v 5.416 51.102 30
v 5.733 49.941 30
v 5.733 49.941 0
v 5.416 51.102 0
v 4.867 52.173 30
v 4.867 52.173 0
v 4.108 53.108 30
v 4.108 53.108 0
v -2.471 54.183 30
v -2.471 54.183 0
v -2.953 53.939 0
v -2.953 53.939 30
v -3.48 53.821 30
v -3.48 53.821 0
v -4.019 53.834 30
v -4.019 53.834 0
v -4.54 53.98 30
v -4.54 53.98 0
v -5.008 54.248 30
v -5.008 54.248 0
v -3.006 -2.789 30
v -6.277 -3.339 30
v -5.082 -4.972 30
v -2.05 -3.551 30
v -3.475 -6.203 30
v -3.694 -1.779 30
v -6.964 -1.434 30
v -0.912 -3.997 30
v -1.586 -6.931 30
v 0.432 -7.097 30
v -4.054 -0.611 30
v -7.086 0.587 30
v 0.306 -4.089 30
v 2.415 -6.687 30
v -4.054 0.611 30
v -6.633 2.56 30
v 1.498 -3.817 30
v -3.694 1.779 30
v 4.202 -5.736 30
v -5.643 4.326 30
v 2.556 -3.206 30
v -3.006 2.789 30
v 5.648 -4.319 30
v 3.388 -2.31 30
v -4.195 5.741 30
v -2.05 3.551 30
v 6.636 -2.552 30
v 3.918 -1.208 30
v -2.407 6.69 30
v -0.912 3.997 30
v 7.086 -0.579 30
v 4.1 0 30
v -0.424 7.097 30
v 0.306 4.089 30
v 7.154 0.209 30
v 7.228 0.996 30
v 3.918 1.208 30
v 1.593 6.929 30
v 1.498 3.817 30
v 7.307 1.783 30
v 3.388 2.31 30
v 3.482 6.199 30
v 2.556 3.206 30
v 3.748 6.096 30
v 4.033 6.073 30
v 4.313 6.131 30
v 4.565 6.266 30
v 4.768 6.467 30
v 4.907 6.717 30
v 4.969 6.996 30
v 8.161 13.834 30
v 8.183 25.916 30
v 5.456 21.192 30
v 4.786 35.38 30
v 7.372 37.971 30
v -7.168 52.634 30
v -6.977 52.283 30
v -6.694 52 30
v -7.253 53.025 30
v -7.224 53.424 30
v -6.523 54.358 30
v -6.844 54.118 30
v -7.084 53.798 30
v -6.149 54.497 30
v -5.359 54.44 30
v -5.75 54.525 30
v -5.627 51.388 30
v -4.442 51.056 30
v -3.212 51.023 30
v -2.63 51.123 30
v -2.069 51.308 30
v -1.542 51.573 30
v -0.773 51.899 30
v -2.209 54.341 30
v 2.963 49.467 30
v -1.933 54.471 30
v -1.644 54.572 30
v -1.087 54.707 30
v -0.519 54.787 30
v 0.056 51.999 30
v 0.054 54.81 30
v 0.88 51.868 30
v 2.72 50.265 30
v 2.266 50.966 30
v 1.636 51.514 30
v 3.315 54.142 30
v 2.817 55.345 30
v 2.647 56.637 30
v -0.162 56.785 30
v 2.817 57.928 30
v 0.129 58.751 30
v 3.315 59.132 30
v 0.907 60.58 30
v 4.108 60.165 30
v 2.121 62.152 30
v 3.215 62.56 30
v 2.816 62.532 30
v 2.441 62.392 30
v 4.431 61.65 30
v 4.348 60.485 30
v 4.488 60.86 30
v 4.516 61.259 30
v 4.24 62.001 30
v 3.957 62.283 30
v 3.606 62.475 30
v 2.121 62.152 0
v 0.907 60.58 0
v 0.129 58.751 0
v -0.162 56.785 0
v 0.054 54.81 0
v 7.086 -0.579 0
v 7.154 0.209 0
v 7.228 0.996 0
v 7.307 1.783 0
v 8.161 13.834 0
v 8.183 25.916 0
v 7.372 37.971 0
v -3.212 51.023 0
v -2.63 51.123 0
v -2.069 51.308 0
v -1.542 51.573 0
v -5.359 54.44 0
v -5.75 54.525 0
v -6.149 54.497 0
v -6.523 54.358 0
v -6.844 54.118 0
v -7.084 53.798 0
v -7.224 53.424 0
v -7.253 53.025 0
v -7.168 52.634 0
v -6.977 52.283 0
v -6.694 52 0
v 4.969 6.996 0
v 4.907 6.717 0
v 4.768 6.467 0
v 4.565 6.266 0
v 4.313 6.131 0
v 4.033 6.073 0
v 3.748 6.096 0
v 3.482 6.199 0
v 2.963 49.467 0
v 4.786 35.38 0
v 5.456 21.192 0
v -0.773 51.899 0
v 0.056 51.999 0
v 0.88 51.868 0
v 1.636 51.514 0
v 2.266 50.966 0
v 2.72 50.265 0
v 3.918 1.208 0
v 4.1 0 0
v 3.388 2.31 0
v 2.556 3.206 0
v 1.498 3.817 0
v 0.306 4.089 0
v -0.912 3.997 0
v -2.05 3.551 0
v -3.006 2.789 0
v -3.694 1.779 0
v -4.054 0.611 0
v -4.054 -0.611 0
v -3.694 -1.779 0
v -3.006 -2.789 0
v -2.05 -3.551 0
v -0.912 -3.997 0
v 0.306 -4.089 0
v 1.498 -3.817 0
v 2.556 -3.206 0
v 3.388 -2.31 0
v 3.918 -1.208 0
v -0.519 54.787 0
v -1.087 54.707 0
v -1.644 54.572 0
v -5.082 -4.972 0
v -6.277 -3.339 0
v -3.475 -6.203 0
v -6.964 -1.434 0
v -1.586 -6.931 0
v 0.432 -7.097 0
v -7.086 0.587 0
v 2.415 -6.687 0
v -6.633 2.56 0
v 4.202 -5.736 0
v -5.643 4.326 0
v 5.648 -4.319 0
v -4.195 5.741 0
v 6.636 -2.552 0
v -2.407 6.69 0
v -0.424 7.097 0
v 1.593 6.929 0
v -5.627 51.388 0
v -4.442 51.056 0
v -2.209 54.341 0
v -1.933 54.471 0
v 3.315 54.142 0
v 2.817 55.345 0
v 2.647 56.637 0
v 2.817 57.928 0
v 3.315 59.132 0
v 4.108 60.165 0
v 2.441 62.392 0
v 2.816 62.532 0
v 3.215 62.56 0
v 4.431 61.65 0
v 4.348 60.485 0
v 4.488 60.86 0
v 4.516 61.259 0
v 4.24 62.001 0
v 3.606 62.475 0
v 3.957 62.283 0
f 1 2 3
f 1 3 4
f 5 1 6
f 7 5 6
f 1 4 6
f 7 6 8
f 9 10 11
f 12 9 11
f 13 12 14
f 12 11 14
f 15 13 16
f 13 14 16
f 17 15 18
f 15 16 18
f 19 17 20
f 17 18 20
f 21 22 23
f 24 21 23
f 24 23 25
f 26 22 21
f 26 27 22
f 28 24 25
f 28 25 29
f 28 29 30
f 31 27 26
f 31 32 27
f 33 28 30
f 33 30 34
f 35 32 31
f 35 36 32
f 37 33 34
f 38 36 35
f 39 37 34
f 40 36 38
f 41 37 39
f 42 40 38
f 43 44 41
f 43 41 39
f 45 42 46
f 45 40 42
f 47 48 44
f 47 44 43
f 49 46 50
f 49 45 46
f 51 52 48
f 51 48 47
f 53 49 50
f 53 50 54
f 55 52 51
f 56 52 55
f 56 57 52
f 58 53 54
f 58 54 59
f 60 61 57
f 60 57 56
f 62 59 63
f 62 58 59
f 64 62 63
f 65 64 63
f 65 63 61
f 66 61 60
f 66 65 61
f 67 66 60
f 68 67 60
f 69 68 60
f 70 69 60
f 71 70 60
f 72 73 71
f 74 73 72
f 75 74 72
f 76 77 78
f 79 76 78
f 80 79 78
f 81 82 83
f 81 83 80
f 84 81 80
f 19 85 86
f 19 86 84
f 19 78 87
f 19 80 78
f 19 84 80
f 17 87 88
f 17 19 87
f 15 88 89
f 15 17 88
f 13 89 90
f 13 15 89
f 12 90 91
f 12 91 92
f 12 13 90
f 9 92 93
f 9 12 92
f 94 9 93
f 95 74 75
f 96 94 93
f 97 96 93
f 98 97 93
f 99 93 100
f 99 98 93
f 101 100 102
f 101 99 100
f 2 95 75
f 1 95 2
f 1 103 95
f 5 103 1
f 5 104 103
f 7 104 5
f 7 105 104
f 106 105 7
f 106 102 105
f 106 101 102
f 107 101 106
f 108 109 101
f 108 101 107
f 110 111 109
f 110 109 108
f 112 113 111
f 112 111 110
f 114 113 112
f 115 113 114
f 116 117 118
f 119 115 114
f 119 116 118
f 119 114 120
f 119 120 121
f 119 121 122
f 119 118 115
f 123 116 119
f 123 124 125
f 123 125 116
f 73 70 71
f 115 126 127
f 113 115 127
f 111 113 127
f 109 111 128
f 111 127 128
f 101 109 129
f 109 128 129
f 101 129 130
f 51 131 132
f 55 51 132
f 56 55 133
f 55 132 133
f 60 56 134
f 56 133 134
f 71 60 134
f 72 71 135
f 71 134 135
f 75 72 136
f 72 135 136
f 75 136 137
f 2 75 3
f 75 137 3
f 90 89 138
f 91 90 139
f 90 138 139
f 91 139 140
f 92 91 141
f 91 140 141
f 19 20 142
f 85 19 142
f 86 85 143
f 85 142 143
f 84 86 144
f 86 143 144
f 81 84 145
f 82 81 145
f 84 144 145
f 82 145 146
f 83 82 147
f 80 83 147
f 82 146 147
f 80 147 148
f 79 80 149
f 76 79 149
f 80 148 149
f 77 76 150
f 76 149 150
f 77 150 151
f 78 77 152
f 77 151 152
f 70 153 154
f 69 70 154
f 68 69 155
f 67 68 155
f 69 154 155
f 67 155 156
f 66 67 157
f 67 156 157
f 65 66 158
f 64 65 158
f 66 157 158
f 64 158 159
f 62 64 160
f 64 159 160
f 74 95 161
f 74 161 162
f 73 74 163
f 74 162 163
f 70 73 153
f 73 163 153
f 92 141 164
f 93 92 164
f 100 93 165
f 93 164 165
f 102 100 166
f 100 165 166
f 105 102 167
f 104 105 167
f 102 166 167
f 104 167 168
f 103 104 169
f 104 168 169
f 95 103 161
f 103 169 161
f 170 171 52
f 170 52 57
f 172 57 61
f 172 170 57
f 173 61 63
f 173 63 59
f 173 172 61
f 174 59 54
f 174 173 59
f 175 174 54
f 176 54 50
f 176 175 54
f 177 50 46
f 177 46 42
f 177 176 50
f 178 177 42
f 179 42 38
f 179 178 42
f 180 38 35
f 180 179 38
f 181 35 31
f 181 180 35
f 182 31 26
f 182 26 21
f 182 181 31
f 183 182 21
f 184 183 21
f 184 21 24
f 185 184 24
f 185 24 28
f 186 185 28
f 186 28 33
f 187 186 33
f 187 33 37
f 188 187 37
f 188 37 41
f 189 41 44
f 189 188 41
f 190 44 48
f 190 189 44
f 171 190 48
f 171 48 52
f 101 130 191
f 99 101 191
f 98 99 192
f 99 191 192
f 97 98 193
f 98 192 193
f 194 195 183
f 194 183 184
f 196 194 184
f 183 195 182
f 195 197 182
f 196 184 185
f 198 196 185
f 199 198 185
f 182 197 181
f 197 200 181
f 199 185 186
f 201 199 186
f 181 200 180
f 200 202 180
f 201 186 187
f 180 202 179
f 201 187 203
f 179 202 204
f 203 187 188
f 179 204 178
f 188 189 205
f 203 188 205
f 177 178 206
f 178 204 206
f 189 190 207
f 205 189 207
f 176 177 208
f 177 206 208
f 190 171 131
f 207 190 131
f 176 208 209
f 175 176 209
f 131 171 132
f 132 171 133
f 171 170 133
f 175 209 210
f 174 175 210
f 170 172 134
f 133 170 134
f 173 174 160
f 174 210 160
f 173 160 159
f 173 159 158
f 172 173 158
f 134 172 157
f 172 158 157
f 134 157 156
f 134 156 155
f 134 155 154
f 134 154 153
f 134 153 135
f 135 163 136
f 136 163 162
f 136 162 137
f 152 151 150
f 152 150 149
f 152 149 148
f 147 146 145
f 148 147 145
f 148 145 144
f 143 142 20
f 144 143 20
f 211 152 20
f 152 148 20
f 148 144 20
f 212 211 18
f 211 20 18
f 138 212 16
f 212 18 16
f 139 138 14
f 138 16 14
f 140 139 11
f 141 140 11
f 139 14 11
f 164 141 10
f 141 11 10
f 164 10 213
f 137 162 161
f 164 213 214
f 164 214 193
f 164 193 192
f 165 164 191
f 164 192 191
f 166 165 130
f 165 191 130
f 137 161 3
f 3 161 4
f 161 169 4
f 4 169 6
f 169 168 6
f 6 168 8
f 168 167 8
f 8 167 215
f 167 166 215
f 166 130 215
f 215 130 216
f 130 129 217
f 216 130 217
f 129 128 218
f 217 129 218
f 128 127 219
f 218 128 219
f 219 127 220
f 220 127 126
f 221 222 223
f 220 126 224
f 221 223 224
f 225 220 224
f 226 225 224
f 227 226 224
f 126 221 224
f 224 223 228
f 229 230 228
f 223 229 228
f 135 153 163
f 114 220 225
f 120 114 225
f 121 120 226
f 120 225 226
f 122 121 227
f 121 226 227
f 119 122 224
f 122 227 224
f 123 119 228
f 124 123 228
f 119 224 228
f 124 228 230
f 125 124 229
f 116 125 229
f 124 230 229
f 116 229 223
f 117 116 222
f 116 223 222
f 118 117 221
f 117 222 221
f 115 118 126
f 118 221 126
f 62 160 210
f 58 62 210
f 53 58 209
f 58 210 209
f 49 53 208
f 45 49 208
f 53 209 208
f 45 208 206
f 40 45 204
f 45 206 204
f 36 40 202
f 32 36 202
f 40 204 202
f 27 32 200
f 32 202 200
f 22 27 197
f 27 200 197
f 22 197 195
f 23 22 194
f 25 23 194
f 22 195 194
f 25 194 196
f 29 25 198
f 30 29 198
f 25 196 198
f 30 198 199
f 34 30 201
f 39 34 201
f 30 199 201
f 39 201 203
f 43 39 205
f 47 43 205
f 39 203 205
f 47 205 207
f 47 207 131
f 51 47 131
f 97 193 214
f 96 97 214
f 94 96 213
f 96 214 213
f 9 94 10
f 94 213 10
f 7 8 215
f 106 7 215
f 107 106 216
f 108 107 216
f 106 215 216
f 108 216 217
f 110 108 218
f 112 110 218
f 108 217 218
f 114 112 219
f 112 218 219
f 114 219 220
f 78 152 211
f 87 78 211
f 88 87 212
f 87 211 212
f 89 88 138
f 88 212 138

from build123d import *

# Parameters (mm, degrees)
SKETCH1_R           = 4.1
BOSS_EXTRUDE1_DEPTH = 30


with BuildPart() as part:
    # Sketch1 → Boss-Extrude1 (new body)
    with BuildSketch(Plane.XY):
        with BuildLine():
            ThreePointArc((2.121320344, 62.15218613), (0.128747602, 58.750955542), (0.053741668, 54.809751443))
            ThreePointArc((0.053741668, 54.809751443), (-0.804117699, 54.754085047), (-1.644372539, 54.572444612))
            ThreePointArc((-1.644372539, 54.572444612), (-2.072579341, 54.409614804), (-2.471000729, 54.183484289))
            ThreePointArc((-2.471000729, 54.183484289), (-3.749930813, 53.810707626), (-5.008263036, 54.248))
            ThreePointArc((-5.008263036, 54.248), (-6.975263036, 53.967), (-6.694263036, 52))
            ThreePointArc((-6.694263036, 52), (-5.044448782, 51.185750479), (-3.211825355, 51.023329036))
            ThreePointArc((-3.211825355, 51.023329036), (-2.346266102, 51.205491656), (-1.541903785, 51.573428203))
            ThreePointArc((-1.541903785, 51.573428203), (1.27066207, 51.717612537), (2.963447684, 49.46688095))
            ThreePointArc((2.963447684, 49.46688095), (5.265961581, 28.292845916), (4.96853298, 6.996065265))
            ThreePointArc((4.96853298, 6.996065265), (4.443724564, 6.189701484), (3.481666266, 6.199201562))
            ThreePointArc((3.481666266, 6.199201562), (-6.277419511, -3.338578183), (7.086411369, -0.578682913))
            ThreePointArc((7.086411369, -0.578682913), (7.189943669, 0.602744357), (7.307479638, 1.782860719))
            ThreePointArc((7.307479638, 1.782860719), (8.182981219, 25.916176913), (5.733322853, 49.940802351))
            ThreePointArc((5.733322853, 49.940802351), (5.169389034, 51.652077868), (4.108290399, 53.108290399))
            ThreePointArc((4.108290399, 53.108290399), (2.646753237, 56.636753237), (4.108290399, 60.165216075))
            ThreePointArc((4.108290399, 60.165216075), (4.108290399, 62.15218613), (2.121320344, 62.15218613))
        make_face()
        Circle(SKETCH1_R, mode=Mode.SUBTRACT)
    extrude(amount=BOSS_EXTRUDE1_DEPTH)


solid = part.part
